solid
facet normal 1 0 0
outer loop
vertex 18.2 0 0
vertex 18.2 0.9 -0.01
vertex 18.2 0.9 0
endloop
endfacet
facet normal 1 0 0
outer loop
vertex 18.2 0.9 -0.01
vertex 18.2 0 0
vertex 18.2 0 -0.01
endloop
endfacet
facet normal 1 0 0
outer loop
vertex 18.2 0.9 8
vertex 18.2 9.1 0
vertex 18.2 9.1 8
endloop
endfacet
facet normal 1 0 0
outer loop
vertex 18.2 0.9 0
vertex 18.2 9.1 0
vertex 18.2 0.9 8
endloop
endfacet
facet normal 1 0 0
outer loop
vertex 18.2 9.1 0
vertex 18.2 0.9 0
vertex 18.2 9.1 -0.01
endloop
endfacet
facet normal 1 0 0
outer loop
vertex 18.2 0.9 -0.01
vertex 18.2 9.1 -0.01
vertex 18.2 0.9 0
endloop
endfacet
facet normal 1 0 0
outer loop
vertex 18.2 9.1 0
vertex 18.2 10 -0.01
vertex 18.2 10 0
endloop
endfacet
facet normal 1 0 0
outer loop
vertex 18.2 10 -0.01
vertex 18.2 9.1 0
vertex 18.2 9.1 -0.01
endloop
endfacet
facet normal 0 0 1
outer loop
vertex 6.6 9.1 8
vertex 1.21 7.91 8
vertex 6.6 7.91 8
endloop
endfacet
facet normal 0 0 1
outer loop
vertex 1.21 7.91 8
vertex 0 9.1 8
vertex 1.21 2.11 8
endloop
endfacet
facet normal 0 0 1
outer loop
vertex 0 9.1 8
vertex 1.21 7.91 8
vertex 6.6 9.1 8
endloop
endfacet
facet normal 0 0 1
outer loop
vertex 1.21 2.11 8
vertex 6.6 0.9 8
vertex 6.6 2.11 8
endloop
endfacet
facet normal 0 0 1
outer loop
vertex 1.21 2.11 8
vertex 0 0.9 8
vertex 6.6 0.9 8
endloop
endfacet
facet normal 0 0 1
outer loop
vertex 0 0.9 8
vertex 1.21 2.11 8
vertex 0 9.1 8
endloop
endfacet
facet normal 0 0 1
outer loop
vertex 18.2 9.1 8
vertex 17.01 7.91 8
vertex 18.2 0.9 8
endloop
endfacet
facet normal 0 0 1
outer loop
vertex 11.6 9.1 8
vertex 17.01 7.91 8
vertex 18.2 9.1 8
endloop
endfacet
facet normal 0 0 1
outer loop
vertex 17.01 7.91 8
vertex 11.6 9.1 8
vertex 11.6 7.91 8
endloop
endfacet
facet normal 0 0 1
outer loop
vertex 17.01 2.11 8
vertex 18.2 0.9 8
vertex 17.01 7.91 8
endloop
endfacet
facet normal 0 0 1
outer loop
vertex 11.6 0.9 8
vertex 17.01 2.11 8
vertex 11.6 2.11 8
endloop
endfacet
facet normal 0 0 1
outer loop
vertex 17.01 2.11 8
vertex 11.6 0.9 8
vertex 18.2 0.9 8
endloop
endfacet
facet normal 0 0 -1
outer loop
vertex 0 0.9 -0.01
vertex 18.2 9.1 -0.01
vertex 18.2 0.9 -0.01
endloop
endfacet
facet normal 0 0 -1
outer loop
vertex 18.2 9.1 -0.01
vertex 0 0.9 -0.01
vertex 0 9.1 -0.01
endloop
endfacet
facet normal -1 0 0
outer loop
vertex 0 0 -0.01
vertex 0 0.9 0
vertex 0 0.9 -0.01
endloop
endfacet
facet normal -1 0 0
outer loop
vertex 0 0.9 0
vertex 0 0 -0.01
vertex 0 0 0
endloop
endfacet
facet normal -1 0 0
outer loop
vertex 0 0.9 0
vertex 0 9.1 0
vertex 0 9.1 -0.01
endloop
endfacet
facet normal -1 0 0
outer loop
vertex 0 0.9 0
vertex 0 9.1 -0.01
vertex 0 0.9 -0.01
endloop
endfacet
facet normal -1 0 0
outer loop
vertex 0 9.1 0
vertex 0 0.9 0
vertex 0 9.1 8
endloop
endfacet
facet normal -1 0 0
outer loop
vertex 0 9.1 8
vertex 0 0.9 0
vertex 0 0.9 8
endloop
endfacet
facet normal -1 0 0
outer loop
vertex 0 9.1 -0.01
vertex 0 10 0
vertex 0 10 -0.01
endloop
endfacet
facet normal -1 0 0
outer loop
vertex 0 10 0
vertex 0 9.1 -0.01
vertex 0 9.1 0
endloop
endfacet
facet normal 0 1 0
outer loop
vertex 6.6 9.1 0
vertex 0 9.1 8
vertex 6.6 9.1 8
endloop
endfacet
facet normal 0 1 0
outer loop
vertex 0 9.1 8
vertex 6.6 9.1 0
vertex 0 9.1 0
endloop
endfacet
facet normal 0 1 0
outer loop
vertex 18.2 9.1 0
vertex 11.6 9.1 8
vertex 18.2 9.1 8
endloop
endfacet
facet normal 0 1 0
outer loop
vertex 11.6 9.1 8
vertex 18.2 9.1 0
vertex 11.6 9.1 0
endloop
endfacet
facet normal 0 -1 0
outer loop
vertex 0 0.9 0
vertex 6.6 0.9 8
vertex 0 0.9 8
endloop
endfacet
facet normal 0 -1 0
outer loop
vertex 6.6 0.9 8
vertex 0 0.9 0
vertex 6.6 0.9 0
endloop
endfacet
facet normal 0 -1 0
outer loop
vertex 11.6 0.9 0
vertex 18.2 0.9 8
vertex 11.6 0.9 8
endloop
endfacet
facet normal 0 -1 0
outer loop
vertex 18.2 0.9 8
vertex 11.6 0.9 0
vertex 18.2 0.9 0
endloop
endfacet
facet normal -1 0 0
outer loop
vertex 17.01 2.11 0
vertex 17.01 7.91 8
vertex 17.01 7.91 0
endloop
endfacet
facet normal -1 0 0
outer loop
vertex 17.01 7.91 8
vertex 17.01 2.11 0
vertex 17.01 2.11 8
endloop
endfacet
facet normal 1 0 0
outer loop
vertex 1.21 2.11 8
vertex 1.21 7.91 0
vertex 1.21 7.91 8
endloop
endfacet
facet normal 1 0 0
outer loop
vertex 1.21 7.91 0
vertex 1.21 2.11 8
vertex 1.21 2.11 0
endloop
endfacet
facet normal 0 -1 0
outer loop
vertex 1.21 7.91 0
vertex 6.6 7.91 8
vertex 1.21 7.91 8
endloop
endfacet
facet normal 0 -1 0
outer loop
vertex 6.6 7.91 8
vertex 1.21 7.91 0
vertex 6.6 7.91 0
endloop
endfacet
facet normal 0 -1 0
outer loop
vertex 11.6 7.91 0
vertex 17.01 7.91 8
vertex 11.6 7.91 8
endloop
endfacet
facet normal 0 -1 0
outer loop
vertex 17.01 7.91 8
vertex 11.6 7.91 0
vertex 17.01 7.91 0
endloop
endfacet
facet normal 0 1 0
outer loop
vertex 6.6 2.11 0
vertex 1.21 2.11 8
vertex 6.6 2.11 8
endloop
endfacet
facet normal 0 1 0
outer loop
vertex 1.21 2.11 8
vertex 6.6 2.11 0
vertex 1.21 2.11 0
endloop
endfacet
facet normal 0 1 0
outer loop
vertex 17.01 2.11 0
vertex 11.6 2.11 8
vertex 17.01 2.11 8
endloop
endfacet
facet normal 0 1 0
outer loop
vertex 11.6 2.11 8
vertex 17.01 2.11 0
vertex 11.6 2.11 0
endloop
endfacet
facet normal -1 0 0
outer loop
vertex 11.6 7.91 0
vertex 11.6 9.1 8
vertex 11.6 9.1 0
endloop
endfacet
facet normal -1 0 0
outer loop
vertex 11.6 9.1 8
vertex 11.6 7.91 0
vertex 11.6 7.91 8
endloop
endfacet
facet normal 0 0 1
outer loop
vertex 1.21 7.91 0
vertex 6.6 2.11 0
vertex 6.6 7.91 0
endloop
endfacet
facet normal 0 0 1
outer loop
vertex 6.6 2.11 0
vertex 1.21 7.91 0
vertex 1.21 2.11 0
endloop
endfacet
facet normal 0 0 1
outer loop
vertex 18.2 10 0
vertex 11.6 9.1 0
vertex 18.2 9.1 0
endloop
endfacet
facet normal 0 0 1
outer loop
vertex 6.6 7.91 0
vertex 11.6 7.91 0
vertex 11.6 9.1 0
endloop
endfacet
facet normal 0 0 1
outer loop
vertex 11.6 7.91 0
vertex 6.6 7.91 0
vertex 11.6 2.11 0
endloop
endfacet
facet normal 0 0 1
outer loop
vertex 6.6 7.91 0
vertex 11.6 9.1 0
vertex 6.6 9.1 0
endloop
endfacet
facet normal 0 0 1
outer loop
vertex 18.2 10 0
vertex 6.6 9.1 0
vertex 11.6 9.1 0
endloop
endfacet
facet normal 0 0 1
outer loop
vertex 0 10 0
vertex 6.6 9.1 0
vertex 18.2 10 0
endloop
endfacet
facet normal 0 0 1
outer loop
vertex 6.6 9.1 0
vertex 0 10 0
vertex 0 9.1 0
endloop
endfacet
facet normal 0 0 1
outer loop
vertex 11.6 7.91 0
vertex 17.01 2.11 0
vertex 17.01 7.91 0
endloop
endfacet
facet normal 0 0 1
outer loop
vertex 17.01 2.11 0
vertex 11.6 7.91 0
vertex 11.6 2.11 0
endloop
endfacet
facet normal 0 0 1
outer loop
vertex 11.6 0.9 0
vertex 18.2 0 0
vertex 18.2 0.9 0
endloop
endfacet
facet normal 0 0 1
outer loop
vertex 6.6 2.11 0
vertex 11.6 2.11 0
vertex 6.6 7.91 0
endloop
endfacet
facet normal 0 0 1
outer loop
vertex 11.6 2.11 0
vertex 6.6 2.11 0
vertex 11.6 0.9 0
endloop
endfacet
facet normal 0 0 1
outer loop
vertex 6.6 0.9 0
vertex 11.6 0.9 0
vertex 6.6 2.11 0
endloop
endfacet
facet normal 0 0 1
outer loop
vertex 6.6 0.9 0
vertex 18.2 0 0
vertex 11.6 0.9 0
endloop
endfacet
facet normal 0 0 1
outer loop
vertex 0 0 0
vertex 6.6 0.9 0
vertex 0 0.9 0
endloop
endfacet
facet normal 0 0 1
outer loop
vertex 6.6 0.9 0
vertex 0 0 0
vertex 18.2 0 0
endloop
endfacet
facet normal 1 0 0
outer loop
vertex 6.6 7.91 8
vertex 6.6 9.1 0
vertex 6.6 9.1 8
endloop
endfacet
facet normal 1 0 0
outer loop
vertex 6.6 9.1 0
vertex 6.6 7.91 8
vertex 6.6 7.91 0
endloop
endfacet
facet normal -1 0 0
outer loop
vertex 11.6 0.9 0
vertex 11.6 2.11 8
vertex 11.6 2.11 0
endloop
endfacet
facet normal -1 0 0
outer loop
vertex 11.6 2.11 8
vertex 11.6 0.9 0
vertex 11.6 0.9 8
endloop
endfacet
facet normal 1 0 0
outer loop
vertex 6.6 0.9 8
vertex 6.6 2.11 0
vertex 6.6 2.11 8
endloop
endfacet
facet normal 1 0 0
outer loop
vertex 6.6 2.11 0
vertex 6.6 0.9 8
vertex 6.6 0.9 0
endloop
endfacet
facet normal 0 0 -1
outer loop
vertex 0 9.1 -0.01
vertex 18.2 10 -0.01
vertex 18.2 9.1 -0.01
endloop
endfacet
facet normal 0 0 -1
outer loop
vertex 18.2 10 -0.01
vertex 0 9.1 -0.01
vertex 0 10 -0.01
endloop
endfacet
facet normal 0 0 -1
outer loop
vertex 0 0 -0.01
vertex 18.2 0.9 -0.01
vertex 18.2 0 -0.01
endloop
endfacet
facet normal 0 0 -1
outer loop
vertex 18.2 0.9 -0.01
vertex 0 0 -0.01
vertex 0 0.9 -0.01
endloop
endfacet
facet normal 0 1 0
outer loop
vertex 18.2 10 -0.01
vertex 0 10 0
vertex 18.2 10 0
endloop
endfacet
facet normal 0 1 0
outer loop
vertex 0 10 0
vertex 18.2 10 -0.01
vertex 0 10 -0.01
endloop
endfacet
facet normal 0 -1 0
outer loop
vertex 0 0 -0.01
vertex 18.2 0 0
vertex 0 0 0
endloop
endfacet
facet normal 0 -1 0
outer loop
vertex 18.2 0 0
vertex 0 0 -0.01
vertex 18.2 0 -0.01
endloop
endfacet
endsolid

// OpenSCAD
// file: ../Base/PlacementOptions.scad
// Fischertechnik Box Foundation
// Placement Options

// Alignment
NoAlign = 0;
AlignLeft = 1;
AlignBottom = 2;
AlignCenter = 3;
AlignRight = 4;
AlignTop = 5;

// Element rotation degree steps
rotations = [0, -90, -180, -270];

// Rotation
NoRotation = 0;
Rotate0 = 0;
Rotate90 = 1;
Rotate180 = 2;
Rotate270 = 3;

// Docking (seen from above)
NoDock = -1;
DockLeft = 0;
DockTop = 1;
DockRight = 2;
DockCorner = 2;
DockBottom = 3;

// Web corners
LowerLeft = 0;
UpperLeft = 1;
UpperRight = 2;
LowerRight = 3;

// Web position relative to corner
LeftOfCorner = 0;
RightOfCorner = 1;

// Rails direction
Horizontal = true;
Vertical = false;
// file: ../Base/Boxes.scad
// Fischertechnik Box Foundation
// Pre-designed Boxes

use <Constants.scad>

include <PlacementOptions.scad>

box190Width = 190;
box190Depth = 130;
box130Width = 130;
box130Depth = 95;

// Values are from an original ec3 box
topBottomDifference = 1.5;
outerHeight = 40;
baseThickness = 1.8;
innerHeight = outerHeight - baseThickness;
stackExcess = 5.7;
radius = 3.5;
wallThickness = 1.5;
tolerance = 0.2;

boxWallThickness = wallThickness;
boxBaseThickness = baseThickness;
boxWebWidth = 3.0;

// getBoxWallThickness()
// Gets the wall thickness of a Fischertechnik Box
function getBoxWallThickness() = boxWallThickness;

// getBoxUsageHeight(height = 38.2)
// Gets the usable height of a Fischertechnik box
// height = Outer height of the box from the bottom to the upper edge.
function getBoxUsageHeight(height = outerHeight) = height - baseThickness - stackExcess;

// getBoxInnerHeight()
// Gets the inner height of a Fischertechnik box, including the stack excess
function getBoxInnerHeight() = innerHeight;

// getBoxBaseThickness()
// Gets the thickness of the Fischertechnik box base.
function getBoxBaseThickness() = boxBaseThickness;

// getBoxWebWidth()
// Gets the width of a box web
function getBoxWebWidth() = boxWebWidth;

// getBox190Space()
// Gets the usable inner space of a Box 190 as an x/y-list
function getBox190Space() = [
    box190Width - 2*getBoxWallThickness() - topBottomDifference, 
    box190Depth - 2*getBoxWallThickness() - topBottomDifference ];

// RoundedCornerPlate(width, depth, height, radius)
// Creates a body plate with rounded corners for a box. Used
// also to create the complete box with the hull module.
// width = Width of the plate
// depth = depth of the plate 
// height = thickness of the plate
// radius = radius of the rounded corner
module RoundedCornerPlate(width, depth, height, radius) {
    translate([radius, radius])
    hull() {
        w = width-2*radius;
        d = depth-2*radius;
        cube([w, d, height]);
        cylinder(height, r=radius, $fn=getFragments());
        translate([w, 0])
            cylinder(height, r=radius, $fn=getFragments());
        translate([w, d])
            cylinder(height, r=radius, $fn=getFragments());
        translate([0, d])
            cylinder(height, r=radius, $fn=getFragments());
    }
}

// BoxBase(width, depth)
// Creates an empty stackable Fischertechnik compatible box
// width = Outer width of the box (190, 130, ...)
// depth = Outer depth of the box (130, 95, ...)

module BoxBase(width, depth, height=outerHeight) {    
    thinPlate = 0.01;

    innerHeight = height - baseThickness;    
    
    module Body(tolerance=tolerance) {
        hull() {
            // Bottom with tolerance to fit into the original boxes when stacked
            translate([-wallThickness+tolerance, -wallThickness+tolerance, -baseThickness])
                RoundedCornerPlate(width-topBottomDifference-2*tolerance, depth-topBottomDifference-2*tolerance, thinPlate, radius);
            
            // Top
            translate([-wallThickness-topBottomDifference/2, -wallThickness-topBottomDifference/2, innerHeight-thinPlate])
                RoundedCornerPlate(width, depth, thinPlate, radius);
         }
    }

    module Cutoff() {
        hull() {
            coWidth = width - 2*wallThickness;
            coDepth = depth - 2*wallThickness;
            
            // Bottom
            RoundedCornerPlate(coWidth-topBottomDifference, coDepth-topBottomDifference, thinPlate, radius);

            // Top
            translate([-topBottomDifference/2, -topBottomDifference/2, innerHeight+thinPlate]) 
                RoundedCornerPlate(coWidth, coDepth, thinPlate, radius);
        }
    }
    
    difference() {        
        Body();
        Cutoff();
        stackOffset = innerHeight - stackExcess;
        translate([0, 0, stackOffset + baseThickness])
            Body(tolerance=0);
    }
}

// Creates the Fischertechnik empty box 130x190 mm and places it at position 0,0
// 190x130 are the outer sizes, the inner space is slightly smaller. Use getBox190Space() to get the inner sizes.
// The box is positioned that the usable inner space is at the 0,0,0 position.

module Box190() {
    BoxBase(box190Width, box190Depth);
}

// Gets the usable inner space of a Box 130 as an x/y-list
function getBox130Space() = [
    box130Width - 2*getBoxWallThickness() - topBottomDifference, 
    box130Depth - 2*getBoxWallThickness() - topBottomDifference ];

// Creates the Fischertechnik empty box 95x130 mm and places it at position 0,0
// 190x130 are the outer sizes, the inner space is slightly smaller. Use getBox190Space() to get the inner sizes.
// The box is positioned that the usable inner space is at the 0,0,0 position.

module Box130() {
    BoxBase(box130Width, box130Depth);
}

// Creates a web at the specified box walls
// corner 0 = LowerLeft, 1 = UpperLeft, 2 = UpperRight, 3 = LowerRight
// side 0 = LeftOfCorner, 1 = RightOfCorner
// distance = Distance in mm from the corner
// boxSpace = inner width and depth of the box (default: Box 190)
// webWidth = length of the web (default is 3 mms)
// webThickness = thickness of the web (default is 1 mm)
// height = Height of the web (standard is getBoxUsageHeight())
// sink = How much of the web is sunk into the wall

module BoxWeb(
    corner, 
    side, 
    distance, 
    boxSpace=getBox190Space(), 
    webWidth=getBoxWebWidth(), 
    webThickness=1.0, 
    height=getBoxUsageHeight(),
    sink = getBoxWallThickness()/2) {
    width = (corner % 2 == 0) ? 
            (side == LeftOfCorner ? webWidth : webThickness) :
            (side == LeftOfCorner ? webThickness : webWidth);

    depth = (corner % 2 == 0) ? 
            (side == RightOfCorner ? webWidth : webThickness) :
            (side == RightOfCorner ? webThickness : webWidth);
    
    xDiff = corner == LowerLeft ? 
                (side == LeftOfCorner ? -sink : distance) :
            (corner == UpperLeft ?                
                (side == LeftOfCorner ? distance : -sink) :
            (corner == UpperRight ?
                (side == LeftOfCorner ? boxSpace.x-webWidth+sink : boxSpace.x-distance-webThickness) :
                (side == LeftOfCorner ? boxSpace.x-distance-webThickness: boxSpace.x-webWidth+sink)));

    yDiff = corner == LowerLeft ? 
                (side == RightOfCorner ? -sink : distance) :
            (corner == UpperLeft ?
                (side == RightOfCorner ? boxSpace.y-distance-webThickness : boxSpace.y-webWidth+sink) :
            (corner == UpperRight ?
                (side == RightOfCorner ? boxSpace.y-webWidth+sink : boxSpace.y-distance-webThickness) :
                (side == RightOfCorner ? distance : -sink)));
    
    translate([xDiff, yDiff, -getExcess()])
        cube([width, depth, height + 2*getExcess()]);
}
// file: ../Base/Rotation.scad
// Fischertechnik Box Foundation
// Geometry Helpers Rotation

include <PlacementOptions.scad>

// getRotatedSpace(space, rotation=NoRotation)
// Rotates the space dependent on the specified rotation

function getRotatedSpace(space, rotation=NoRotation) = [
    (rotation == Rotate90 || rotation == Rotate270) ? space.y : space.x,
    (rotation == Rotate90 || rotation == Rotate270) ? space.x : space.y
];

// Rotates the given space around the fixed left lower corner
// space = the space the children needs as width/depth list [width,depth]
// rotation = 0 Rotate0 degrees, 1 Rotate90 degrees, 2 Rotate180 degrees, 3 Rotate270 degrees (equivalent to -90)

module RotateFix(space, rotation=NoRotation) {
    dy = (rotation == Rotate0 || rotation == Rotate270) ? 0 :
        (rotation == Rotate90) ? space.x :
        space.y;
    dx = (rotation < Rotate180) ? 0 :
        (rotation == Rotate180) ? space.x :
        space.y;
    
    translate([dx, dy, 0])
        rotate([0, 0, rotations[rotation]])
            children();
}
// file: ../Base/Alignment.scad
// Fischertechnik Box Foundation
// Geometry Helpers Alignment

include <PlacementOptions.scad>

// getAlignedX(elementWidth, spaceWidth, align=AlignRight, offset=0)
// Gets the aligned X offset of an element with the given
// width in the given space.
// elementWidth = The width of the element to positon
// spaceWidth = The space where the element should be aligned
// align = 0 AlignLeft, 1 AlignCenter, 2 AlignRight
// offset = an optional offset from the aligned position. When
// aligned left or centered, then positive values are in X direction.
// When aligned right then positive values are in negative X direction.

function getAlignedX(elementWidth, spaceWidth, align=AlignRight, offset=0) =
    (align == AlignLeft) ?
        offset :
        ((align == AlignCenter) ?
        (spaceWidth - elementWidth)/2 + offset :
        spaceWidth - offset - elementWidth);

// getAlignedY(elementDepth, spaceDepth, align=AlignTop, offset=0)
// Gets the aligned Y offset of an element with the given
// depth in the given space.
// elementDepth = The depth of the element to positon
// spaceDepth = The space where the element should be aligned
// align = 0 AlignBottom, 1 AlignCenter, 2 AlignTop
// offset = an optional offset from the aligned position. When
// aligned bottom or centered, then positive values are in Y direction.
// When aligned top then positive values are in negative Y direction.

function getAlignedY(elementDepth, spaceDepth, align=AlignTop, offset=0) =
    (align == AlignBottom) ?
        offset :
        ((align == AlignCenter) ?
        (spaceDepth - elementDepth)/2 + offset :
        spaceDepth - offset - elementDepth);
// file: ../Base/Placement.scad
// Fischertechnik Box Foundation
// Geometry Helpers Placement

use <Constants.scad>
use <Alignment.scad>
use <Rotation.scad>
use <Boxes.scad>

include <PlacementOptions.scad>

// Place(x=0, y=0, elementSpace=[0,0], alignX=AlignLeft, alignY=AlignBottom, rotation=Rotate0, boxSpace=getBox190Space())
// Places the child at the specified position
// y = Y-Position. This is a relative position when an X aligment is specified.
// x = X-Position. This is a relative position when an Y aligment is specified.
// elementSpace = space of the element to be placed [x,y]
// alignX = -1=NoAlign, 0 AlignLeft, 1 AlignCenter, 3 AlignRight (elementSpace and boxSpace required!)
// alignY = -1=NoAlign, 2 AlignBottom, 1 AlignCenter, 4 AlignTop (elementSpace and boxSpace required!)
// rotation = 0 Rotate0 0 degrees, 1 Rotate90 90 degrees, 
// 2 Rotate180 180 degrees, 3 Rotate270 270 degrees (equivalent to -90)
// boxSpace = Inner space of the box where the placement occurs [x,y] - default is Box 190x130 inner space

module Place(x=0, y=0, elementSpace=[0,0], 
  alignX=AlignLeft, alignY=AlignBottom, 
  rotation=NoRotation, boxSpace=getBox190Space()) {

    module Position(x, y, space, rotation=Rotate0) {
        translate([x, y, 0])
            RotateFix(space, rotation)
                children();
    }

    space = getRotatedSpace(elementSpace, rotation);
    alignedX = getAlignedX(space.x, boxSpace.x, alignX, x);
    alignedY = getAlignedY(space.y, boxSpace.y, alignY, y);
    Position(alignedX, alignedY, elementSpace, rotation)
        children();
}

// Center(space=getBox130Space(), elementSpace=[0,0])
// space = Space where the children is centered. For cylinder use centered=true and no elementSpace.
// elementSpace = space of the element to be centered [x,y]

module Center(space=getBox190Space(), elementSpace=[0,0]) {
    Place(elementSpace=elementSpace, boxSpace=space, alignX=AlignCenter, alignY=AlignCenter)
        children();
}

// CenterHorizontal(width=0, y=0, offset=0, space=getBox130Space())
// width = Width of the element to be placed.
// y = Y position of the element
// offset = Offset from the center position (negative will be left of the center)
// space = Space where the element is placed

module CenterHorizontal(width=0, y=0, offset=0, space=getBox190Space()) {
    Place(x=offset, y=y, elementSpace=[width, 0], boxSpace=space, alignX=AlignCenter)
        children(0);
}

// CenterVertical(depth=0, x=0, offset=0, space=getBox130Space())
// depth = Depth of the element to be placed.
// x = X position of the element
// offset = Offset from the center position (negative will be down of the center)
// space = Space where the element is placed

module CenterVertical(depth=0, x=0, offset=0, space=getBox190Space()) {
    Place(x=x, y=offset, elementSpace=[0, depth], boxSpace=space, alignY=AlignCenter)
        children(0);
}

// getIsVertical(align)
// True if the specified alignment needs a vertical orientation for a divider (AlignRight, AlignLeft)

function getIsVertical(align) = (align == AlignRight || align == AlignLeft);

// getIsHorizontal(align)
// True if the specified alignment needs a horizontal orientation for a divider (AlignTop, AlignBottom)

function getIsHorizontal(align) = (align == AlignTop || align == AlignBottom);
// file: ../Base/Constants.scad
// Fischertechnik Box Foundation
// Constants

// Constant values necessary for multiple elements

// Base constants
dividerThickness = 1.2;
excess = 0.01;
fragments = 90;
tolerance = 0.8;

// Gets the thickness of a divider 
function getDividerThickness() = dividerThickness;

// Gets the excess that is used to merge walls into each other
function getExcess() = excess;

// Gets amount of fragments of a cylinder
function getFragments() = fragments;

// Gets the inner tolerance of a frame to each side
function getTolerance() = tolerance;


// Fischertechnik specific constants
axisDiameter = 4;
axisBottomDiameter = axisDiameter + 1;
axisTolerance = 0.2;
axisLockingLength = 8;

// Gets axis diameter of Fischertechnik axis
function getAxisDiameter() = axisDiameter;

// Gets axis diameter tolerance (subtracted for element axis)
function getAxisTolerance() = axisTolerance;

// Gets the axis diameter for standing axis
function getStandAxisDiameter() = getAxisDiameter() - getAxisTolerance();

// Gets axis bottom diameter for thicker part at the bottom
function getAxisBottomDiameter() = axisBottomDiameter;

// Gets the lengthh of the locking part of a locking axis
function getAxisLockingLength() = axisLockingLength;

// Studs

studHeight = 2.5;
studTolerance = 0.2;

// gets the height of a connecting stud
function getStudHeight() = studHeight;

// gets the connecting stud height tolerance
function getStudTolerance() = studTolerance;

// Dockable Frame with Edge

standardEdgeDistance = 2.5;
standardWebDistance = 11.5;
standardCornerLength = 15;

// gets the standard distance to the wall of the box for dockable frames with webs
function getStandardEdgeDistance() = standardEdgeDistance;

// gets the standard distance of each web to the corner of the dockable frame
function getStandardWebDistance() = standardWebDistance;

// gets the standard length of the corner walls of a dockable frame
function getStandardCornerLength() = standardCornerLength;

// Tubes

tubeWallFactor = 0.8;

// gets the wall thickness of a tube.
function getTubeWallThickness() = tubeWallFactor * getDividerThickness();

// Small Parts and Divider Frame

smallPartsFrameHeight = 20;

// gets the frame height for docked small parts boxes.
function getSmallPartsFrameHeight() = smallPartsFrameHeight;

// Hubs

hubRingDiameter = 19.5;
hubRingLevelDiameter = 21;

// gets the diameter of a tube matching the inner ring of a wheel
function getHubRingDiameter() = hubRingDiameter;

// gets the diameter of a hub tube with a thicker diameter
function getHubRingLevelDiameter() = hubRingLevelDiameter;

// Struts

strutAddLength = 9.0;
strutDepth = 8.0;

// gets the full length of a strut
function getFullStrutLength(length) = length + strutAddLength;

// gets the radius of the end of a strut
function getStrutEndRadius() = strutAddLength / 2;

// gets the the depth of a strut
function getStrutDepth() = strutDepth;
// main file
// Fischertechnik Box Library
// Frame for block 5 with two studs
// 37238

use <../Base/Constants.scad>
use <../Base/Placement.scad>
use <../ModelBase/Simple.scad>

/* [Element Parameters] */
count = 1;

/* [Hidden] */
width = 15;
depth = 5;
height = 8;

// getFrameBlock5TwoStudsSpace(count=1)
// Gets the space of a frame for count block 5 with two studs

function getFrameBlock5TwoStudsSpace(count=1) = getFrameOuterVolume([width * count, depth, height]);


// FrameBlock5TwoStuds(count=1)
// Frame for count block 5 with two studs

module FrameBlock5TwoStuds(count=1) {
    space = [
        getFrameBlock5TwoStudsSpace(count).x, 
        depth + 2*getStudHeight(), 
        getFrameBlock5TwoStudsSpace(count).z];
    Space(space);
    volume = [width * count, depth, height];

    CenterVertical(getFrameBlock5TwoStudsSpace(count).y, space=space) {
        difference() {
            Frame(volume);
            cutoffWidth = 5;
            FrameTopCutoffs(volume, count, cutoffWidth);
            FrameBottomCutoffs(volume, count, cutoffWidth);
        }
    }
}

// Tests
color("lightgray")
FrameBlock5TwoStuds(count);
